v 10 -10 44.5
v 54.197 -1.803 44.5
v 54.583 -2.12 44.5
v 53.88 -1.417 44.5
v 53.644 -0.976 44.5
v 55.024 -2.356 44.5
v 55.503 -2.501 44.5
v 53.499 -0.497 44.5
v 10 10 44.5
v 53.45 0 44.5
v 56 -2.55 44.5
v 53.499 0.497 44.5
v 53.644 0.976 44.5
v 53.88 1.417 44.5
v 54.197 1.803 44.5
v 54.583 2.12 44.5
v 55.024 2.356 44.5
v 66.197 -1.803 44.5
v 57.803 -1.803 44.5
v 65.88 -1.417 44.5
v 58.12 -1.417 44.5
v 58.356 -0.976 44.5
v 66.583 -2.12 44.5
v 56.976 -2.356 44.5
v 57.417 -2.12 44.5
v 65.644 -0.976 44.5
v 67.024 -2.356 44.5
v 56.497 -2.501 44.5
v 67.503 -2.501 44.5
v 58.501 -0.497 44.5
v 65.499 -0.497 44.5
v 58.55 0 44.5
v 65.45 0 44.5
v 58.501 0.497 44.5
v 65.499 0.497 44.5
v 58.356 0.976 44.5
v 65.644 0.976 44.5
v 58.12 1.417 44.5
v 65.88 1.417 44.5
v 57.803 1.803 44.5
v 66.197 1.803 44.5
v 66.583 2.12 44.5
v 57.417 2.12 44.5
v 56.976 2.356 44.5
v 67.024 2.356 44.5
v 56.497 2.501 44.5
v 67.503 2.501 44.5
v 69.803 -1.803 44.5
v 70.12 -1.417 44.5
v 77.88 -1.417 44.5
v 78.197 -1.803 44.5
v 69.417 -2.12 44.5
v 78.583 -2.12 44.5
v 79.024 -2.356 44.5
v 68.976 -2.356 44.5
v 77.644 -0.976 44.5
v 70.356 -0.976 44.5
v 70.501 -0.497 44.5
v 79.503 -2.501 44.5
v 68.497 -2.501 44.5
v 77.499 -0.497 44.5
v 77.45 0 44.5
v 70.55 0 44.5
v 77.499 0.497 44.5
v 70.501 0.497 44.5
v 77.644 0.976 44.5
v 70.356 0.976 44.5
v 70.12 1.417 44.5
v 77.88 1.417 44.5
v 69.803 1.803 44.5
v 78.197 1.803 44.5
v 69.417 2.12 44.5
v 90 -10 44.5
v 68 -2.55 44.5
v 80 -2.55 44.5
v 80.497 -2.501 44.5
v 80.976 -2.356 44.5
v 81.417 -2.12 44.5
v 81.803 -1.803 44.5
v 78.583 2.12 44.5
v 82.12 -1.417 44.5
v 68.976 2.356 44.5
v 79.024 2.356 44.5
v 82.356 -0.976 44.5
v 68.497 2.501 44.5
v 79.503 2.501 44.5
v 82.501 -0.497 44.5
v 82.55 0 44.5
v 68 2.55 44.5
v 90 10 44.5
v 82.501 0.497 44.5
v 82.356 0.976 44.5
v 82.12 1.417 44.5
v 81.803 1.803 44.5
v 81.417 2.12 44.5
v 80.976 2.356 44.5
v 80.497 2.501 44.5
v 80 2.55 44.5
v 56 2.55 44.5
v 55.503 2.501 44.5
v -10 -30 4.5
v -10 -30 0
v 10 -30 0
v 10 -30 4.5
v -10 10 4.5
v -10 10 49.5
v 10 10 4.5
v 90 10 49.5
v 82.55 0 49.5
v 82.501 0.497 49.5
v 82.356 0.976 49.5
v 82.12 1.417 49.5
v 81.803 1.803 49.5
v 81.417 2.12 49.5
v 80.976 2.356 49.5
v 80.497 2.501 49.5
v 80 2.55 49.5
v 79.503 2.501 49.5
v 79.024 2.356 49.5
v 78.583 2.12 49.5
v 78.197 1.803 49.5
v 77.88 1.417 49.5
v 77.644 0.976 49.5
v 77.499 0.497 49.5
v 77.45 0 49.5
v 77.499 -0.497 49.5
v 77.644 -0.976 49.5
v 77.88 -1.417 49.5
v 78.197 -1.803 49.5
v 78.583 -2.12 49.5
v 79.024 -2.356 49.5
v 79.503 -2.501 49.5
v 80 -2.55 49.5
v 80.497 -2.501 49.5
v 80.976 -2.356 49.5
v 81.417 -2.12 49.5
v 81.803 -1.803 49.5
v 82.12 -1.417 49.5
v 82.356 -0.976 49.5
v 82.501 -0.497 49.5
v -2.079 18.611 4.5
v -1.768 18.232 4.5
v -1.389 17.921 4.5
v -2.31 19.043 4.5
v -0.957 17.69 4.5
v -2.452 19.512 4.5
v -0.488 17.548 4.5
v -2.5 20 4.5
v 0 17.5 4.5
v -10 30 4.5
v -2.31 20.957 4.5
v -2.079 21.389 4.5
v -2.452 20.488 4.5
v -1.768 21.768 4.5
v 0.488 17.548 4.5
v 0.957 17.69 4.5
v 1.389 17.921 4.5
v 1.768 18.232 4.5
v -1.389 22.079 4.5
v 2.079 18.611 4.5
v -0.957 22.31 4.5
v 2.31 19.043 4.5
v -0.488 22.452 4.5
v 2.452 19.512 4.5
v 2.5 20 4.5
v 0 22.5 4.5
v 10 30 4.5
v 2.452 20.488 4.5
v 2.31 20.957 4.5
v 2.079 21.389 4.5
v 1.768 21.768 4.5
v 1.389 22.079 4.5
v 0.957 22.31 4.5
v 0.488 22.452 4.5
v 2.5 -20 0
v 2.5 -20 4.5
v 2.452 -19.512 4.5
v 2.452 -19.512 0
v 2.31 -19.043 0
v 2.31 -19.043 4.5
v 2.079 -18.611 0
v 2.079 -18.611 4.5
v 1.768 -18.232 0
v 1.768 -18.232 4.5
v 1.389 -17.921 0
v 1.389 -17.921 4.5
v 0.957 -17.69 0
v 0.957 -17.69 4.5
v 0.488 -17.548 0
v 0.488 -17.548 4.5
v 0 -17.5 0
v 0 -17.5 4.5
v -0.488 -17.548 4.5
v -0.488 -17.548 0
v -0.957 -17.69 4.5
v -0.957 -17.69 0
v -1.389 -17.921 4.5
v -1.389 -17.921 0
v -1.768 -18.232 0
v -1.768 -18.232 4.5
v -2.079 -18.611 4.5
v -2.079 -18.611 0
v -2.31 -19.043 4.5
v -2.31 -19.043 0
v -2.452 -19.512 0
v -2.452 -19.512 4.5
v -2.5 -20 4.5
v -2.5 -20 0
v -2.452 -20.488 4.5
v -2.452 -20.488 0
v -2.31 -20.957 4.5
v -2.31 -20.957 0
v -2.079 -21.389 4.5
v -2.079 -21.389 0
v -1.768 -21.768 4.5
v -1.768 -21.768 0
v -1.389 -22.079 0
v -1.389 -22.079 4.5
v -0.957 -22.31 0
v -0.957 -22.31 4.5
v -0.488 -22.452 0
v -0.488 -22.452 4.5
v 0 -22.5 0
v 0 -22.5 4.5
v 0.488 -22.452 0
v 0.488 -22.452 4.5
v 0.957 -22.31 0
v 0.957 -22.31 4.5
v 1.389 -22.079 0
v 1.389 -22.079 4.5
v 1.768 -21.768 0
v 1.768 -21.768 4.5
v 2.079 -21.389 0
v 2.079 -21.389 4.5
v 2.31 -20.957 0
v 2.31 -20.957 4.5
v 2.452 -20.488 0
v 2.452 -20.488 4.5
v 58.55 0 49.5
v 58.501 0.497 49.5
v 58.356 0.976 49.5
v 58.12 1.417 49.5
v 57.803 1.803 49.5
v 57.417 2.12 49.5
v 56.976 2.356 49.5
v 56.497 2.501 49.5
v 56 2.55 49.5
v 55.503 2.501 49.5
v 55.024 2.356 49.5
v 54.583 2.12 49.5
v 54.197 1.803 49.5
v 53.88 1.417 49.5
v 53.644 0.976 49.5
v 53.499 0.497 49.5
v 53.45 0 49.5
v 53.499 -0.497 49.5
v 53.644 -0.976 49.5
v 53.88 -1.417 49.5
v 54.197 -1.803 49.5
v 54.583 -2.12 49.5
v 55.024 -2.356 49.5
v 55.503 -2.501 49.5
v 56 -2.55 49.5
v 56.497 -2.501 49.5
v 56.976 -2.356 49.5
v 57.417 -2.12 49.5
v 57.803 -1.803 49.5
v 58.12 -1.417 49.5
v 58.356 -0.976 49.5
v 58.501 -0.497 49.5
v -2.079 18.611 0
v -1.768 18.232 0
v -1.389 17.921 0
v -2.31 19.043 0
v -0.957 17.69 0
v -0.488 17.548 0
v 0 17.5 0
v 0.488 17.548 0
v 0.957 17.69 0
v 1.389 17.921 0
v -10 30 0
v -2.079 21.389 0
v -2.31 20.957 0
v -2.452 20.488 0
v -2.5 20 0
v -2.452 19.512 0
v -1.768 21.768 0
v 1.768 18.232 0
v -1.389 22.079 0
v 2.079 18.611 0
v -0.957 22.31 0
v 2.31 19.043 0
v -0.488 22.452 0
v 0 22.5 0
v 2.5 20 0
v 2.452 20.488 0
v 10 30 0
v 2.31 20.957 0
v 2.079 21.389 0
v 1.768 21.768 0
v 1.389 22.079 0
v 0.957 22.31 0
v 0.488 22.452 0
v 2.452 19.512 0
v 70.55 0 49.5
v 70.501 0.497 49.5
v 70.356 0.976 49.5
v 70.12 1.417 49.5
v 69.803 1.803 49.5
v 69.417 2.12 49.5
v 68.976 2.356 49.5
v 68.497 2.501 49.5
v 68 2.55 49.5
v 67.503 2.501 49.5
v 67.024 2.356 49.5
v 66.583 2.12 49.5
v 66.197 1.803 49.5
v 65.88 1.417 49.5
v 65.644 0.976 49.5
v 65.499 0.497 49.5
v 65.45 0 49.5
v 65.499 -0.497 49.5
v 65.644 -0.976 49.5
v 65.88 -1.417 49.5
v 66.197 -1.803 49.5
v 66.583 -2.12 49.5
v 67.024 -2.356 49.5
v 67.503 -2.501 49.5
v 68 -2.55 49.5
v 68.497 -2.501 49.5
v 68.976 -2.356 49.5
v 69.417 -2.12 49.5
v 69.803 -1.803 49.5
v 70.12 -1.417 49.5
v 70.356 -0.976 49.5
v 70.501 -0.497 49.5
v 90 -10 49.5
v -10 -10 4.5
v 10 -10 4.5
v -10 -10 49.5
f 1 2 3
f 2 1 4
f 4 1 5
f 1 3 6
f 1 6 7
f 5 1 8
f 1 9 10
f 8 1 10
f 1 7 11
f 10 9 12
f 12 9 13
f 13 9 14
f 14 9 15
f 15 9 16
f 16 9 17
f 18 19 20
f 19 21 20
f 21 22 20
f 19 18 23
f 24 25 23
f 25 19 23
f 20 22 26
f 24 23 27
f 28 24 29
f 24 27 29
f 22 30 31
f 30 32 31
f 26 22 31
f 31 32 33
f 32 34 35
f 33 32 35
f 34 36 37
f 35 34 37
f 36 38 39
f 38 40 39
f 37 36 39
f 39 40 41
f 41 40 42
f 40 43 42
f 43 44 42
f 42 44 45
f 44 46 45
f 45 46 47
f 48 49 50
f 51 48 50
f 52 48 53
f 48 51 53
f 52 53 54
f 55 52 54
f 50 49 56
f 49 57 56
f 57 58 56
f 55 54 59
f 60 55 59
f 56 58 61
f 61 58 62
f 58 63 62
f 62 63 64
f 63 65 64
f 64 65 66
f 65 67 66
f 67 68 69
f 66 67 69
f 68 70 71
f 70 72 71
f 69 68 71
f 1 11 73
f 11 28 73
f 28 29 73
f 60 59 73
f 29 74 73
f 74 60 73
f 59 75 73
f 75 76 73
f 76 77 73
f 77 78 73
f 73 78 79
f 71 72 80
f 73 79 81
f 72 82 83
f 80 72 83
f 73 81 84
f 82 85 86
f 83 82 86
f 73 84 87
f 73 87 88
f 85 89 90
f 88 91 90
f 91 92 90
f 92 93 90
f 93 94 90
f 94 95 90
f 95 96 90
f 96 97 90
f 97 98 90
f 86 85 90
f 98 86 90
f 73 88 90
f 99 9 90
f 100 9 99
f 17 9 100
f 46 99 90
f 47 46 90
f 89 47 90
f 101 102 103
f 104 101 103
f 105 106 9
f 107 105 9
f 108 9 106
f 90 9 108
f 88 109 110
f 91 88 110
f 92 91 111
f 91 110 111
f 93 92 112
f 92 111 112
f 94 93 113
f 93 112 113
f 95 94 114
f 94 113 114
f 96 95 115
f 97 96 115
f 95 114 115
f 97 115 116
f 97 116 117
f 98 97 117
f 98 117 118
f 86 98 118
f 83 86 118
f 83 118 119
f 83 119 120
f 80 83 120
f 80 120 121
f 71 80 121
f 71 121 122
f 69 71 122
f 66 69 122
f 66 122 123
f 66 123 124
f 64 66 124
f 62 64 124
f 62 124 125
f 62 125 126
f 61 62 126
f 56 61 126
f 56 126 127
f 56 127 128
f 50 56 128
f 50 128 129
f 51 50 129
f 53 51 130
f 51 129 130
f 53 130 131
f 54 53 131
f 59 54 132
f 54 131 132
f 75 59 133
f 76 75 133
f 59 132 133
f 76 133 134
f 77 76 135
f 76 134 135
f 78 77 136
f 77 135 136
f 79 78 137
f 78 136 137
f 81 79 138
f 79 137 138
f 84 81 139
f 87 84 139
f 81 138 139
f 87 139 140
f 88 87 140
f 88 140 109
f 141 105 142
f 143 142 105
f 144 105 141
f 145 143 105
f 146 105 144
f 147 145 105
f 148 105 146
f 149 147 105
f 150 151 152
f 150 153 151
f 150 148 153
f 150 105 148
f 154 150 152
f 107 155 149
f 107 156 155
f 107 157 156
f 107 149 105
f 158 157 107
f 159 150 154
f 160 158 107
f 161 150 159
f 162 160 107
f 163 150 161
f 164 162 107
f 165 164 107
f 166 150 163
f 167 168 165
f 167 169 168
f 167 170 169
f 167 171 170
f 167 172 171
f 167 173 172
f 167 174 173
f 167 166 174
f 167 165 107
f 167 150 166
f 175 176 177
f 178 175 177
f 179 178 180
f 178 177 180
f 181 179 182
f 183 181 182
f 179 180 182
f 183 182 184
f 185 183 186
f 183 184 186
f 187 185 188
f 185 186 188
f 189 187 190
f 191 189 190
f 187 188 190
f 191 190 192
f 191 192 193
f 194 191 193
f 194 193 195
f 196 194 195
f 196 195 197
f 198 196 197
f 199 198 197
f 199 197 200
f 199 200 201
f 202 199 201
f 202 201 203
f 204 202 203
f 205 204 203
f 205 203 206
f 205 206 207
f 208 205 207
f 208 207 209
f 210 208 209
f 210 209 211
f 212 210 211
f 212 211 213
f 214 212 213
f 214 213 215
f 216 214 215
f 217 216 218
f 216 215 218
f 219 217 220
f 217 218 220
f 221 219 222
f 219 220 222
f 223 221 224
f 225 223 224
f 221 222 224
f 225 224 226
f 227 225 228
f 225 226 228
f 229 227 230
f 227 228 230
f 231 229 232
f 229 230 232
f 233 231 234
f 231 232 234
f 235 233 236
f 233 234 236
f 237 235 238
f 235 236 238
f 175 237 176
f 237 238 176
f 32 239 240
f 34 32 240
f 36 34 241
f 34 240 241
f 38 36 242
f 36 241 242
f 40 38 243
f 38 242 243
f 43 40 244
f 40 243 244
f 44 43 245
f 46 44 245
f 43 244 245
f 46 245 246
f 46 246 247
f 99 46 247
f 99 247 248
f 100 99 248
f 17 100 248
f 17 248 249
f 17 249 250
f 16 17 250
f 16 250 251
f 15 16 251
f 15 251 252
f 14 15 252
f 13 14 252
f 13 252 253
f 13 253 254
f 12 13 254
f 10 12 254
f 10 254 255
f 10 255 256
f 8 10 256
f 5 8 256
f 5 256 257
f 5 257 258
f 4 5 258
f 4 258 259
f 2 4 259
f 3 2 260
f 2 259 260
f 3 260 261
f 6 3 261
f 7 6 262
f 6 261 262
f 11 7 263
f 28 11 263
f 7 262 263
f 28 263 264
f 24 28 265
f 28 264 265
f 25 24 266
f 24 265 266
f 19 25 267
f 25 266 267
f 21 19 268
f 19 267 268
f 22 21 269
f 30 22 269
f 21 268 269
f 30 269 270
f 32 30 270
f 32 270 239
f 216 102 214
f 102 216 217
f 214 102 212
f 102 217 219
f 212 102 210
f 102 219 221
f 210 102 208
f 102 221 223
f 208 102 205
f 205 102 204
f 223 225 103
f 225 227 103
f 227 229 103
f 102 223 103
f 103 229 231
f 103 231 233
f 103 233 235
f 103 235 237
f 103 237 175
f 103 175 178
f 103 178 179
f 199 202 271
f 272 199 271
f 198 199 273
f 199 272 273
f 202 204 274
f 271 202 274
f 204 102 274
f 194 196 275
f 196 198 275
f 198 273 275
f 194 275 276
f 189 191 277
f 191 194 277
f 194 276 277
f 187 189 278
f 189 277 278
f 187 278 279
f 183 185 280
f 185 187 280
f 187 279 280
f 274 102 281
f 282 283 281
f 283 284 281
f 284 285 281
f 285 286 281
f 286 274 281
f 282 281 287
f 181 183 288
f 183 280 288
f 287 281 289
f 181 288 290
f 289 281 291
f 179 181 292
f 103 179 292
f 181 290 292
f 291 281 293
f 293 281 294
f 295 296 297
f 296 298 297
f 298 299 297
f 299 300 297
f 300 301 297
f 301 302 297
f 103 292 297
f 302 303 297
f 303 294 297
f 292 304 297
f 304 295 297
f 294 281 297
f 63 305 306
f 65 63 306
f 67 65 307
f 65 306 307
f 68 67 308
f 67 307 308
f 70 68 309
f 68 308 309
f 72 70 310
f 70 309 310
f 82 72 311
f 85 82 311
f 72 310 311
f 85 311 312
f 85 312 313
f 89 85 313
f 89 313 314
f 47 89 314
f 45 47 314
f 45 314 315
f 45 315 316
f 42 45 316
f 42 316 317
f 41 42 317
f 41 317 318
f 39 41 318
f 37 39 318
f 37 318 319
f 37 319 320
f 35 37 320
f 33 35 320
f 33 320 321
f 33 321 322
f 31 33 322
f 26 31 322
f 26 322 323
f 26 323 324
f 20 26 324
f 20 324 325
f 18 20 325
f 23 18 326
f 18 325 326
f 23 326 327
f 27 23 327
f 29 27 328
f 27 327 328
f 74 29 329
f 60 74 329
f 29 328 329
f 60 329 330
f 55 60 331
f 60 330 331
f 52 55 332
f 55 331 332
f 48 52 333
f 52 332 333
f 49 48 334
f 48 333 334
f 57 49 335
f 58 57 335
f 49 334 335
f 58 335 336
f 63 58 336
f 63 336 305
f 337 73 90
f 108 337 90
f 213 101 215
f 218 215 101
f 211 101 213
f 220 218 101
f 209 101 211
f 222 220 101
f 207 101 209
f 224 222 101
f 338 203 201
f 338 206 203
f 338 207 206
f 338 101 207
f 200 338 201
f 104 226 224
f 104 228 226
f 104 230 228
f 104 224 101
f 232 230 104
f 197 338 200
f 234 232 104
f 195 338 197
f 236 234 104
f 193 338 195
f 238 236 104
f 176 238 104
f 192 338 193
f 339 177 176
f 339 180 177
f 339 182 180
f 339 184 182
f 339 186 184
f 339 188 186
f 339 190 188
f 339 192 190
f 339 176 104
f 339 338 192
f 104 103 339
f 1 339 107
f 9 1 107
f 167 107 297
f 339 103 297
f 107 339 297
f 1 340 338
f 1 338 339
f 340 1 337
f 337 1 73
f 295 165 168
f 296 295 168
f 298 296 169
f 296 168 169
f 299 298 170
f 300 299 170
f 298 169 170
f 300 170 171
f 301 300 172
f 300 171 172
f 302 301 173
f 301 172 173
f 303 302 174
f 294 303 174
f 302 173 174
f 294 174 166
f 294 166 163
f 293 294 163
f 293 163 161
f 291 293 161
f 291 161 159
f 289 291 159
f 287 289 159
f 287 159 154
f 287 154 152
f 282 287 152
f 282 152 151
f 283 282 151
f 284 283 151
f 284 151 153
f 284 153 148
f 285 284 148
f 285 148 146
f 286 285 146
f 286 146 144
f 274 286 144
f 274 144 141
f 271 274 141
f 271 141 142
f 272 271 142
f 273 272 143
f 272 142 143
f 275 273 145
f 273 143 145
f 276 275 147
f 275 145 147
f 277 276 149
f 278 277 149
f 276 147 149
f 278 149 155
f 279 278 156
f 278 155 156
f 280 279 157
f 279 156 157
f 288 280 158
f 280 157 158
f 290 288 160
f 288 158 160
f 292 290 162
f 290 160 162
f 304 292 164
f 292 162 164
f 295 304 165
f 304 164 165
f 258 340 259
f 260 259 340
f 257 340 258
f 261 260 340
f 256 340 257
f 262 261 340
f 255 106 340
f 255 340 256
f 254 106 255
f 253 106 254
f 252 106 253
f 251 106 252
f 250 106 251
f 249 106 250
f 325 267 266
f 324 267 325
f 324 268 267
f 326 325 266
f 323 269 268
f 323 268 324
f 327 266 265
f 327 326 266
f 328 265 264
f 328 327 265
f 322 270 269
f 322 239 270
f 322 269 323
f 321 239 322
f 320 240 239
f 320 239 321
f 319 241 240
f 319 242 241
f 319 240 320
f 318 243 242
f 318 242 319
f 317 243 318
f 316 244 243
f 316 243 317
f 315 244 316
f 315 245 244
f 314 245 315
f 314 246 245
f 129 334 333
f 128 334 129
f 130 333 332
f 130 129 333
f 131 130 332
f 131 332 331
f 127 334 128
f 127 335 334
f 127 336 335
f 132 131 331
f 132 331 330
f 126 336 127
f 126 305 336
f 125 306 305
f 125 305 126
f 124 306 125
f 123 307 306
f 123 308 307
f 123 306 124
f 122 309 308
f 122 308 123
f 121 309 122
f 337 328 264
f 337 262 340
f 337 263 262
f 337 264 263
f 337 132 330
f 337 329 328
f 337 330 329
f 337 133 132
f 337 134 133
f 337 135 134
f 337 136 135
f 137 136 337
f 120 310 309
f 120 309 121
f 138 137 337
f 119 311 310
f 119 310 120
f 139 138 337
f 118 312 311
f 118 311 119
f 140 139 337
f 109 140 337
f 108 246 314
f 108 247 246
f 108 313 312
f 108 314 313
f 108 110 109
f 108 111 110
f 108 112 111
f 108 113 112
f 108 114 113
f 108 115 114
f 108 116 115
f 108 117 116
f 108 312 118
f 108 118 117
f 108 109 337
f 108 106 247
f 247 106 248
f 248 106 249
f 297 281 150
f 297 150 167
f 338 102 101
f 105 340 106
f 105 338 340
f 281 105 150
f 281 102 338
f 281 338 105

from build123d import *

# Parameters (mm, degrees)
SKETCH_1_W          = 20
SKETCH_1_H          = 60
EXTRUDE_1_DEPTH     = 4.5
SKETCH_2_W          = 20
SKETCH_2_H          = 20
EXTRUDE_2_DEPTH     = 40
SKETCH_3_W          = 100
SKETCH_3_H          = 20
EXTRUDE_3_DEPTH     = 5
SKETCH_5_R          = 2.5
CUT_EXTRUDE_2_DEPTH = 5
SKETCH_6_R          = 2.55
CUT_EXTRUDE_3_DEPTH = 10


with BuildPart() as part:
    # 草图1 → 凸台-拉伸1 (new body)
    with BuildSketch(Plane.XY):
        Rectangle(SKETCH_1_W, SKETCH_1_H)
    extrude(amount=EXTRUDE_1_DEPTH)

    # 草图2 → 凸台-拉伸2 (add)
    with BuildSketch(Plane.XY.offset(4.5)):
        Rectangle(SKETCH_2_W, SKETCH_2_H)
    extrude(amount=EXTRUDE_2_DEPTH)

    # 草图3 → 凸台-拉伸3 (add)
    with BuildSketch(Plane.XY.offset(44.5)):
        with Locations((40, 0)):
            Rectangle(SKETCH_3_W, SKETCH_3_H)
    extrude(amount=EXTRUDE_3_DEPTH)

    # 草图5 → 切除-拉伸2 (cut)
    with BuildSketch(Plane.XY.offset(4.5)):
        with Locations((0, 20)):
            Circle(SKETCH_5_R)
        with Locations((0, -20)):
            Circle(SKETCH_5_R)
    extrude(amount=-CUT_EXTRUDE_2_DEPTH, mode=Mode.SUBTRACT)

    # 草图6 → 切除-拉伸3 (cut)
    with BuildSketch(Plane.XY.offset(49.5)):
        with Locations((80, 0)):
            Circle(SKETCH_6_R)
        with Locations((68, 0)):
            Circle(SKETCH_6_R)
        with Locations((56, 0)):
            Circle(SKETCH_6_R)
    extrude(amount=-CUT_EXTRUDE_3_DEPTH, mode=Mode.SUBTRACT)


solid = part.part
